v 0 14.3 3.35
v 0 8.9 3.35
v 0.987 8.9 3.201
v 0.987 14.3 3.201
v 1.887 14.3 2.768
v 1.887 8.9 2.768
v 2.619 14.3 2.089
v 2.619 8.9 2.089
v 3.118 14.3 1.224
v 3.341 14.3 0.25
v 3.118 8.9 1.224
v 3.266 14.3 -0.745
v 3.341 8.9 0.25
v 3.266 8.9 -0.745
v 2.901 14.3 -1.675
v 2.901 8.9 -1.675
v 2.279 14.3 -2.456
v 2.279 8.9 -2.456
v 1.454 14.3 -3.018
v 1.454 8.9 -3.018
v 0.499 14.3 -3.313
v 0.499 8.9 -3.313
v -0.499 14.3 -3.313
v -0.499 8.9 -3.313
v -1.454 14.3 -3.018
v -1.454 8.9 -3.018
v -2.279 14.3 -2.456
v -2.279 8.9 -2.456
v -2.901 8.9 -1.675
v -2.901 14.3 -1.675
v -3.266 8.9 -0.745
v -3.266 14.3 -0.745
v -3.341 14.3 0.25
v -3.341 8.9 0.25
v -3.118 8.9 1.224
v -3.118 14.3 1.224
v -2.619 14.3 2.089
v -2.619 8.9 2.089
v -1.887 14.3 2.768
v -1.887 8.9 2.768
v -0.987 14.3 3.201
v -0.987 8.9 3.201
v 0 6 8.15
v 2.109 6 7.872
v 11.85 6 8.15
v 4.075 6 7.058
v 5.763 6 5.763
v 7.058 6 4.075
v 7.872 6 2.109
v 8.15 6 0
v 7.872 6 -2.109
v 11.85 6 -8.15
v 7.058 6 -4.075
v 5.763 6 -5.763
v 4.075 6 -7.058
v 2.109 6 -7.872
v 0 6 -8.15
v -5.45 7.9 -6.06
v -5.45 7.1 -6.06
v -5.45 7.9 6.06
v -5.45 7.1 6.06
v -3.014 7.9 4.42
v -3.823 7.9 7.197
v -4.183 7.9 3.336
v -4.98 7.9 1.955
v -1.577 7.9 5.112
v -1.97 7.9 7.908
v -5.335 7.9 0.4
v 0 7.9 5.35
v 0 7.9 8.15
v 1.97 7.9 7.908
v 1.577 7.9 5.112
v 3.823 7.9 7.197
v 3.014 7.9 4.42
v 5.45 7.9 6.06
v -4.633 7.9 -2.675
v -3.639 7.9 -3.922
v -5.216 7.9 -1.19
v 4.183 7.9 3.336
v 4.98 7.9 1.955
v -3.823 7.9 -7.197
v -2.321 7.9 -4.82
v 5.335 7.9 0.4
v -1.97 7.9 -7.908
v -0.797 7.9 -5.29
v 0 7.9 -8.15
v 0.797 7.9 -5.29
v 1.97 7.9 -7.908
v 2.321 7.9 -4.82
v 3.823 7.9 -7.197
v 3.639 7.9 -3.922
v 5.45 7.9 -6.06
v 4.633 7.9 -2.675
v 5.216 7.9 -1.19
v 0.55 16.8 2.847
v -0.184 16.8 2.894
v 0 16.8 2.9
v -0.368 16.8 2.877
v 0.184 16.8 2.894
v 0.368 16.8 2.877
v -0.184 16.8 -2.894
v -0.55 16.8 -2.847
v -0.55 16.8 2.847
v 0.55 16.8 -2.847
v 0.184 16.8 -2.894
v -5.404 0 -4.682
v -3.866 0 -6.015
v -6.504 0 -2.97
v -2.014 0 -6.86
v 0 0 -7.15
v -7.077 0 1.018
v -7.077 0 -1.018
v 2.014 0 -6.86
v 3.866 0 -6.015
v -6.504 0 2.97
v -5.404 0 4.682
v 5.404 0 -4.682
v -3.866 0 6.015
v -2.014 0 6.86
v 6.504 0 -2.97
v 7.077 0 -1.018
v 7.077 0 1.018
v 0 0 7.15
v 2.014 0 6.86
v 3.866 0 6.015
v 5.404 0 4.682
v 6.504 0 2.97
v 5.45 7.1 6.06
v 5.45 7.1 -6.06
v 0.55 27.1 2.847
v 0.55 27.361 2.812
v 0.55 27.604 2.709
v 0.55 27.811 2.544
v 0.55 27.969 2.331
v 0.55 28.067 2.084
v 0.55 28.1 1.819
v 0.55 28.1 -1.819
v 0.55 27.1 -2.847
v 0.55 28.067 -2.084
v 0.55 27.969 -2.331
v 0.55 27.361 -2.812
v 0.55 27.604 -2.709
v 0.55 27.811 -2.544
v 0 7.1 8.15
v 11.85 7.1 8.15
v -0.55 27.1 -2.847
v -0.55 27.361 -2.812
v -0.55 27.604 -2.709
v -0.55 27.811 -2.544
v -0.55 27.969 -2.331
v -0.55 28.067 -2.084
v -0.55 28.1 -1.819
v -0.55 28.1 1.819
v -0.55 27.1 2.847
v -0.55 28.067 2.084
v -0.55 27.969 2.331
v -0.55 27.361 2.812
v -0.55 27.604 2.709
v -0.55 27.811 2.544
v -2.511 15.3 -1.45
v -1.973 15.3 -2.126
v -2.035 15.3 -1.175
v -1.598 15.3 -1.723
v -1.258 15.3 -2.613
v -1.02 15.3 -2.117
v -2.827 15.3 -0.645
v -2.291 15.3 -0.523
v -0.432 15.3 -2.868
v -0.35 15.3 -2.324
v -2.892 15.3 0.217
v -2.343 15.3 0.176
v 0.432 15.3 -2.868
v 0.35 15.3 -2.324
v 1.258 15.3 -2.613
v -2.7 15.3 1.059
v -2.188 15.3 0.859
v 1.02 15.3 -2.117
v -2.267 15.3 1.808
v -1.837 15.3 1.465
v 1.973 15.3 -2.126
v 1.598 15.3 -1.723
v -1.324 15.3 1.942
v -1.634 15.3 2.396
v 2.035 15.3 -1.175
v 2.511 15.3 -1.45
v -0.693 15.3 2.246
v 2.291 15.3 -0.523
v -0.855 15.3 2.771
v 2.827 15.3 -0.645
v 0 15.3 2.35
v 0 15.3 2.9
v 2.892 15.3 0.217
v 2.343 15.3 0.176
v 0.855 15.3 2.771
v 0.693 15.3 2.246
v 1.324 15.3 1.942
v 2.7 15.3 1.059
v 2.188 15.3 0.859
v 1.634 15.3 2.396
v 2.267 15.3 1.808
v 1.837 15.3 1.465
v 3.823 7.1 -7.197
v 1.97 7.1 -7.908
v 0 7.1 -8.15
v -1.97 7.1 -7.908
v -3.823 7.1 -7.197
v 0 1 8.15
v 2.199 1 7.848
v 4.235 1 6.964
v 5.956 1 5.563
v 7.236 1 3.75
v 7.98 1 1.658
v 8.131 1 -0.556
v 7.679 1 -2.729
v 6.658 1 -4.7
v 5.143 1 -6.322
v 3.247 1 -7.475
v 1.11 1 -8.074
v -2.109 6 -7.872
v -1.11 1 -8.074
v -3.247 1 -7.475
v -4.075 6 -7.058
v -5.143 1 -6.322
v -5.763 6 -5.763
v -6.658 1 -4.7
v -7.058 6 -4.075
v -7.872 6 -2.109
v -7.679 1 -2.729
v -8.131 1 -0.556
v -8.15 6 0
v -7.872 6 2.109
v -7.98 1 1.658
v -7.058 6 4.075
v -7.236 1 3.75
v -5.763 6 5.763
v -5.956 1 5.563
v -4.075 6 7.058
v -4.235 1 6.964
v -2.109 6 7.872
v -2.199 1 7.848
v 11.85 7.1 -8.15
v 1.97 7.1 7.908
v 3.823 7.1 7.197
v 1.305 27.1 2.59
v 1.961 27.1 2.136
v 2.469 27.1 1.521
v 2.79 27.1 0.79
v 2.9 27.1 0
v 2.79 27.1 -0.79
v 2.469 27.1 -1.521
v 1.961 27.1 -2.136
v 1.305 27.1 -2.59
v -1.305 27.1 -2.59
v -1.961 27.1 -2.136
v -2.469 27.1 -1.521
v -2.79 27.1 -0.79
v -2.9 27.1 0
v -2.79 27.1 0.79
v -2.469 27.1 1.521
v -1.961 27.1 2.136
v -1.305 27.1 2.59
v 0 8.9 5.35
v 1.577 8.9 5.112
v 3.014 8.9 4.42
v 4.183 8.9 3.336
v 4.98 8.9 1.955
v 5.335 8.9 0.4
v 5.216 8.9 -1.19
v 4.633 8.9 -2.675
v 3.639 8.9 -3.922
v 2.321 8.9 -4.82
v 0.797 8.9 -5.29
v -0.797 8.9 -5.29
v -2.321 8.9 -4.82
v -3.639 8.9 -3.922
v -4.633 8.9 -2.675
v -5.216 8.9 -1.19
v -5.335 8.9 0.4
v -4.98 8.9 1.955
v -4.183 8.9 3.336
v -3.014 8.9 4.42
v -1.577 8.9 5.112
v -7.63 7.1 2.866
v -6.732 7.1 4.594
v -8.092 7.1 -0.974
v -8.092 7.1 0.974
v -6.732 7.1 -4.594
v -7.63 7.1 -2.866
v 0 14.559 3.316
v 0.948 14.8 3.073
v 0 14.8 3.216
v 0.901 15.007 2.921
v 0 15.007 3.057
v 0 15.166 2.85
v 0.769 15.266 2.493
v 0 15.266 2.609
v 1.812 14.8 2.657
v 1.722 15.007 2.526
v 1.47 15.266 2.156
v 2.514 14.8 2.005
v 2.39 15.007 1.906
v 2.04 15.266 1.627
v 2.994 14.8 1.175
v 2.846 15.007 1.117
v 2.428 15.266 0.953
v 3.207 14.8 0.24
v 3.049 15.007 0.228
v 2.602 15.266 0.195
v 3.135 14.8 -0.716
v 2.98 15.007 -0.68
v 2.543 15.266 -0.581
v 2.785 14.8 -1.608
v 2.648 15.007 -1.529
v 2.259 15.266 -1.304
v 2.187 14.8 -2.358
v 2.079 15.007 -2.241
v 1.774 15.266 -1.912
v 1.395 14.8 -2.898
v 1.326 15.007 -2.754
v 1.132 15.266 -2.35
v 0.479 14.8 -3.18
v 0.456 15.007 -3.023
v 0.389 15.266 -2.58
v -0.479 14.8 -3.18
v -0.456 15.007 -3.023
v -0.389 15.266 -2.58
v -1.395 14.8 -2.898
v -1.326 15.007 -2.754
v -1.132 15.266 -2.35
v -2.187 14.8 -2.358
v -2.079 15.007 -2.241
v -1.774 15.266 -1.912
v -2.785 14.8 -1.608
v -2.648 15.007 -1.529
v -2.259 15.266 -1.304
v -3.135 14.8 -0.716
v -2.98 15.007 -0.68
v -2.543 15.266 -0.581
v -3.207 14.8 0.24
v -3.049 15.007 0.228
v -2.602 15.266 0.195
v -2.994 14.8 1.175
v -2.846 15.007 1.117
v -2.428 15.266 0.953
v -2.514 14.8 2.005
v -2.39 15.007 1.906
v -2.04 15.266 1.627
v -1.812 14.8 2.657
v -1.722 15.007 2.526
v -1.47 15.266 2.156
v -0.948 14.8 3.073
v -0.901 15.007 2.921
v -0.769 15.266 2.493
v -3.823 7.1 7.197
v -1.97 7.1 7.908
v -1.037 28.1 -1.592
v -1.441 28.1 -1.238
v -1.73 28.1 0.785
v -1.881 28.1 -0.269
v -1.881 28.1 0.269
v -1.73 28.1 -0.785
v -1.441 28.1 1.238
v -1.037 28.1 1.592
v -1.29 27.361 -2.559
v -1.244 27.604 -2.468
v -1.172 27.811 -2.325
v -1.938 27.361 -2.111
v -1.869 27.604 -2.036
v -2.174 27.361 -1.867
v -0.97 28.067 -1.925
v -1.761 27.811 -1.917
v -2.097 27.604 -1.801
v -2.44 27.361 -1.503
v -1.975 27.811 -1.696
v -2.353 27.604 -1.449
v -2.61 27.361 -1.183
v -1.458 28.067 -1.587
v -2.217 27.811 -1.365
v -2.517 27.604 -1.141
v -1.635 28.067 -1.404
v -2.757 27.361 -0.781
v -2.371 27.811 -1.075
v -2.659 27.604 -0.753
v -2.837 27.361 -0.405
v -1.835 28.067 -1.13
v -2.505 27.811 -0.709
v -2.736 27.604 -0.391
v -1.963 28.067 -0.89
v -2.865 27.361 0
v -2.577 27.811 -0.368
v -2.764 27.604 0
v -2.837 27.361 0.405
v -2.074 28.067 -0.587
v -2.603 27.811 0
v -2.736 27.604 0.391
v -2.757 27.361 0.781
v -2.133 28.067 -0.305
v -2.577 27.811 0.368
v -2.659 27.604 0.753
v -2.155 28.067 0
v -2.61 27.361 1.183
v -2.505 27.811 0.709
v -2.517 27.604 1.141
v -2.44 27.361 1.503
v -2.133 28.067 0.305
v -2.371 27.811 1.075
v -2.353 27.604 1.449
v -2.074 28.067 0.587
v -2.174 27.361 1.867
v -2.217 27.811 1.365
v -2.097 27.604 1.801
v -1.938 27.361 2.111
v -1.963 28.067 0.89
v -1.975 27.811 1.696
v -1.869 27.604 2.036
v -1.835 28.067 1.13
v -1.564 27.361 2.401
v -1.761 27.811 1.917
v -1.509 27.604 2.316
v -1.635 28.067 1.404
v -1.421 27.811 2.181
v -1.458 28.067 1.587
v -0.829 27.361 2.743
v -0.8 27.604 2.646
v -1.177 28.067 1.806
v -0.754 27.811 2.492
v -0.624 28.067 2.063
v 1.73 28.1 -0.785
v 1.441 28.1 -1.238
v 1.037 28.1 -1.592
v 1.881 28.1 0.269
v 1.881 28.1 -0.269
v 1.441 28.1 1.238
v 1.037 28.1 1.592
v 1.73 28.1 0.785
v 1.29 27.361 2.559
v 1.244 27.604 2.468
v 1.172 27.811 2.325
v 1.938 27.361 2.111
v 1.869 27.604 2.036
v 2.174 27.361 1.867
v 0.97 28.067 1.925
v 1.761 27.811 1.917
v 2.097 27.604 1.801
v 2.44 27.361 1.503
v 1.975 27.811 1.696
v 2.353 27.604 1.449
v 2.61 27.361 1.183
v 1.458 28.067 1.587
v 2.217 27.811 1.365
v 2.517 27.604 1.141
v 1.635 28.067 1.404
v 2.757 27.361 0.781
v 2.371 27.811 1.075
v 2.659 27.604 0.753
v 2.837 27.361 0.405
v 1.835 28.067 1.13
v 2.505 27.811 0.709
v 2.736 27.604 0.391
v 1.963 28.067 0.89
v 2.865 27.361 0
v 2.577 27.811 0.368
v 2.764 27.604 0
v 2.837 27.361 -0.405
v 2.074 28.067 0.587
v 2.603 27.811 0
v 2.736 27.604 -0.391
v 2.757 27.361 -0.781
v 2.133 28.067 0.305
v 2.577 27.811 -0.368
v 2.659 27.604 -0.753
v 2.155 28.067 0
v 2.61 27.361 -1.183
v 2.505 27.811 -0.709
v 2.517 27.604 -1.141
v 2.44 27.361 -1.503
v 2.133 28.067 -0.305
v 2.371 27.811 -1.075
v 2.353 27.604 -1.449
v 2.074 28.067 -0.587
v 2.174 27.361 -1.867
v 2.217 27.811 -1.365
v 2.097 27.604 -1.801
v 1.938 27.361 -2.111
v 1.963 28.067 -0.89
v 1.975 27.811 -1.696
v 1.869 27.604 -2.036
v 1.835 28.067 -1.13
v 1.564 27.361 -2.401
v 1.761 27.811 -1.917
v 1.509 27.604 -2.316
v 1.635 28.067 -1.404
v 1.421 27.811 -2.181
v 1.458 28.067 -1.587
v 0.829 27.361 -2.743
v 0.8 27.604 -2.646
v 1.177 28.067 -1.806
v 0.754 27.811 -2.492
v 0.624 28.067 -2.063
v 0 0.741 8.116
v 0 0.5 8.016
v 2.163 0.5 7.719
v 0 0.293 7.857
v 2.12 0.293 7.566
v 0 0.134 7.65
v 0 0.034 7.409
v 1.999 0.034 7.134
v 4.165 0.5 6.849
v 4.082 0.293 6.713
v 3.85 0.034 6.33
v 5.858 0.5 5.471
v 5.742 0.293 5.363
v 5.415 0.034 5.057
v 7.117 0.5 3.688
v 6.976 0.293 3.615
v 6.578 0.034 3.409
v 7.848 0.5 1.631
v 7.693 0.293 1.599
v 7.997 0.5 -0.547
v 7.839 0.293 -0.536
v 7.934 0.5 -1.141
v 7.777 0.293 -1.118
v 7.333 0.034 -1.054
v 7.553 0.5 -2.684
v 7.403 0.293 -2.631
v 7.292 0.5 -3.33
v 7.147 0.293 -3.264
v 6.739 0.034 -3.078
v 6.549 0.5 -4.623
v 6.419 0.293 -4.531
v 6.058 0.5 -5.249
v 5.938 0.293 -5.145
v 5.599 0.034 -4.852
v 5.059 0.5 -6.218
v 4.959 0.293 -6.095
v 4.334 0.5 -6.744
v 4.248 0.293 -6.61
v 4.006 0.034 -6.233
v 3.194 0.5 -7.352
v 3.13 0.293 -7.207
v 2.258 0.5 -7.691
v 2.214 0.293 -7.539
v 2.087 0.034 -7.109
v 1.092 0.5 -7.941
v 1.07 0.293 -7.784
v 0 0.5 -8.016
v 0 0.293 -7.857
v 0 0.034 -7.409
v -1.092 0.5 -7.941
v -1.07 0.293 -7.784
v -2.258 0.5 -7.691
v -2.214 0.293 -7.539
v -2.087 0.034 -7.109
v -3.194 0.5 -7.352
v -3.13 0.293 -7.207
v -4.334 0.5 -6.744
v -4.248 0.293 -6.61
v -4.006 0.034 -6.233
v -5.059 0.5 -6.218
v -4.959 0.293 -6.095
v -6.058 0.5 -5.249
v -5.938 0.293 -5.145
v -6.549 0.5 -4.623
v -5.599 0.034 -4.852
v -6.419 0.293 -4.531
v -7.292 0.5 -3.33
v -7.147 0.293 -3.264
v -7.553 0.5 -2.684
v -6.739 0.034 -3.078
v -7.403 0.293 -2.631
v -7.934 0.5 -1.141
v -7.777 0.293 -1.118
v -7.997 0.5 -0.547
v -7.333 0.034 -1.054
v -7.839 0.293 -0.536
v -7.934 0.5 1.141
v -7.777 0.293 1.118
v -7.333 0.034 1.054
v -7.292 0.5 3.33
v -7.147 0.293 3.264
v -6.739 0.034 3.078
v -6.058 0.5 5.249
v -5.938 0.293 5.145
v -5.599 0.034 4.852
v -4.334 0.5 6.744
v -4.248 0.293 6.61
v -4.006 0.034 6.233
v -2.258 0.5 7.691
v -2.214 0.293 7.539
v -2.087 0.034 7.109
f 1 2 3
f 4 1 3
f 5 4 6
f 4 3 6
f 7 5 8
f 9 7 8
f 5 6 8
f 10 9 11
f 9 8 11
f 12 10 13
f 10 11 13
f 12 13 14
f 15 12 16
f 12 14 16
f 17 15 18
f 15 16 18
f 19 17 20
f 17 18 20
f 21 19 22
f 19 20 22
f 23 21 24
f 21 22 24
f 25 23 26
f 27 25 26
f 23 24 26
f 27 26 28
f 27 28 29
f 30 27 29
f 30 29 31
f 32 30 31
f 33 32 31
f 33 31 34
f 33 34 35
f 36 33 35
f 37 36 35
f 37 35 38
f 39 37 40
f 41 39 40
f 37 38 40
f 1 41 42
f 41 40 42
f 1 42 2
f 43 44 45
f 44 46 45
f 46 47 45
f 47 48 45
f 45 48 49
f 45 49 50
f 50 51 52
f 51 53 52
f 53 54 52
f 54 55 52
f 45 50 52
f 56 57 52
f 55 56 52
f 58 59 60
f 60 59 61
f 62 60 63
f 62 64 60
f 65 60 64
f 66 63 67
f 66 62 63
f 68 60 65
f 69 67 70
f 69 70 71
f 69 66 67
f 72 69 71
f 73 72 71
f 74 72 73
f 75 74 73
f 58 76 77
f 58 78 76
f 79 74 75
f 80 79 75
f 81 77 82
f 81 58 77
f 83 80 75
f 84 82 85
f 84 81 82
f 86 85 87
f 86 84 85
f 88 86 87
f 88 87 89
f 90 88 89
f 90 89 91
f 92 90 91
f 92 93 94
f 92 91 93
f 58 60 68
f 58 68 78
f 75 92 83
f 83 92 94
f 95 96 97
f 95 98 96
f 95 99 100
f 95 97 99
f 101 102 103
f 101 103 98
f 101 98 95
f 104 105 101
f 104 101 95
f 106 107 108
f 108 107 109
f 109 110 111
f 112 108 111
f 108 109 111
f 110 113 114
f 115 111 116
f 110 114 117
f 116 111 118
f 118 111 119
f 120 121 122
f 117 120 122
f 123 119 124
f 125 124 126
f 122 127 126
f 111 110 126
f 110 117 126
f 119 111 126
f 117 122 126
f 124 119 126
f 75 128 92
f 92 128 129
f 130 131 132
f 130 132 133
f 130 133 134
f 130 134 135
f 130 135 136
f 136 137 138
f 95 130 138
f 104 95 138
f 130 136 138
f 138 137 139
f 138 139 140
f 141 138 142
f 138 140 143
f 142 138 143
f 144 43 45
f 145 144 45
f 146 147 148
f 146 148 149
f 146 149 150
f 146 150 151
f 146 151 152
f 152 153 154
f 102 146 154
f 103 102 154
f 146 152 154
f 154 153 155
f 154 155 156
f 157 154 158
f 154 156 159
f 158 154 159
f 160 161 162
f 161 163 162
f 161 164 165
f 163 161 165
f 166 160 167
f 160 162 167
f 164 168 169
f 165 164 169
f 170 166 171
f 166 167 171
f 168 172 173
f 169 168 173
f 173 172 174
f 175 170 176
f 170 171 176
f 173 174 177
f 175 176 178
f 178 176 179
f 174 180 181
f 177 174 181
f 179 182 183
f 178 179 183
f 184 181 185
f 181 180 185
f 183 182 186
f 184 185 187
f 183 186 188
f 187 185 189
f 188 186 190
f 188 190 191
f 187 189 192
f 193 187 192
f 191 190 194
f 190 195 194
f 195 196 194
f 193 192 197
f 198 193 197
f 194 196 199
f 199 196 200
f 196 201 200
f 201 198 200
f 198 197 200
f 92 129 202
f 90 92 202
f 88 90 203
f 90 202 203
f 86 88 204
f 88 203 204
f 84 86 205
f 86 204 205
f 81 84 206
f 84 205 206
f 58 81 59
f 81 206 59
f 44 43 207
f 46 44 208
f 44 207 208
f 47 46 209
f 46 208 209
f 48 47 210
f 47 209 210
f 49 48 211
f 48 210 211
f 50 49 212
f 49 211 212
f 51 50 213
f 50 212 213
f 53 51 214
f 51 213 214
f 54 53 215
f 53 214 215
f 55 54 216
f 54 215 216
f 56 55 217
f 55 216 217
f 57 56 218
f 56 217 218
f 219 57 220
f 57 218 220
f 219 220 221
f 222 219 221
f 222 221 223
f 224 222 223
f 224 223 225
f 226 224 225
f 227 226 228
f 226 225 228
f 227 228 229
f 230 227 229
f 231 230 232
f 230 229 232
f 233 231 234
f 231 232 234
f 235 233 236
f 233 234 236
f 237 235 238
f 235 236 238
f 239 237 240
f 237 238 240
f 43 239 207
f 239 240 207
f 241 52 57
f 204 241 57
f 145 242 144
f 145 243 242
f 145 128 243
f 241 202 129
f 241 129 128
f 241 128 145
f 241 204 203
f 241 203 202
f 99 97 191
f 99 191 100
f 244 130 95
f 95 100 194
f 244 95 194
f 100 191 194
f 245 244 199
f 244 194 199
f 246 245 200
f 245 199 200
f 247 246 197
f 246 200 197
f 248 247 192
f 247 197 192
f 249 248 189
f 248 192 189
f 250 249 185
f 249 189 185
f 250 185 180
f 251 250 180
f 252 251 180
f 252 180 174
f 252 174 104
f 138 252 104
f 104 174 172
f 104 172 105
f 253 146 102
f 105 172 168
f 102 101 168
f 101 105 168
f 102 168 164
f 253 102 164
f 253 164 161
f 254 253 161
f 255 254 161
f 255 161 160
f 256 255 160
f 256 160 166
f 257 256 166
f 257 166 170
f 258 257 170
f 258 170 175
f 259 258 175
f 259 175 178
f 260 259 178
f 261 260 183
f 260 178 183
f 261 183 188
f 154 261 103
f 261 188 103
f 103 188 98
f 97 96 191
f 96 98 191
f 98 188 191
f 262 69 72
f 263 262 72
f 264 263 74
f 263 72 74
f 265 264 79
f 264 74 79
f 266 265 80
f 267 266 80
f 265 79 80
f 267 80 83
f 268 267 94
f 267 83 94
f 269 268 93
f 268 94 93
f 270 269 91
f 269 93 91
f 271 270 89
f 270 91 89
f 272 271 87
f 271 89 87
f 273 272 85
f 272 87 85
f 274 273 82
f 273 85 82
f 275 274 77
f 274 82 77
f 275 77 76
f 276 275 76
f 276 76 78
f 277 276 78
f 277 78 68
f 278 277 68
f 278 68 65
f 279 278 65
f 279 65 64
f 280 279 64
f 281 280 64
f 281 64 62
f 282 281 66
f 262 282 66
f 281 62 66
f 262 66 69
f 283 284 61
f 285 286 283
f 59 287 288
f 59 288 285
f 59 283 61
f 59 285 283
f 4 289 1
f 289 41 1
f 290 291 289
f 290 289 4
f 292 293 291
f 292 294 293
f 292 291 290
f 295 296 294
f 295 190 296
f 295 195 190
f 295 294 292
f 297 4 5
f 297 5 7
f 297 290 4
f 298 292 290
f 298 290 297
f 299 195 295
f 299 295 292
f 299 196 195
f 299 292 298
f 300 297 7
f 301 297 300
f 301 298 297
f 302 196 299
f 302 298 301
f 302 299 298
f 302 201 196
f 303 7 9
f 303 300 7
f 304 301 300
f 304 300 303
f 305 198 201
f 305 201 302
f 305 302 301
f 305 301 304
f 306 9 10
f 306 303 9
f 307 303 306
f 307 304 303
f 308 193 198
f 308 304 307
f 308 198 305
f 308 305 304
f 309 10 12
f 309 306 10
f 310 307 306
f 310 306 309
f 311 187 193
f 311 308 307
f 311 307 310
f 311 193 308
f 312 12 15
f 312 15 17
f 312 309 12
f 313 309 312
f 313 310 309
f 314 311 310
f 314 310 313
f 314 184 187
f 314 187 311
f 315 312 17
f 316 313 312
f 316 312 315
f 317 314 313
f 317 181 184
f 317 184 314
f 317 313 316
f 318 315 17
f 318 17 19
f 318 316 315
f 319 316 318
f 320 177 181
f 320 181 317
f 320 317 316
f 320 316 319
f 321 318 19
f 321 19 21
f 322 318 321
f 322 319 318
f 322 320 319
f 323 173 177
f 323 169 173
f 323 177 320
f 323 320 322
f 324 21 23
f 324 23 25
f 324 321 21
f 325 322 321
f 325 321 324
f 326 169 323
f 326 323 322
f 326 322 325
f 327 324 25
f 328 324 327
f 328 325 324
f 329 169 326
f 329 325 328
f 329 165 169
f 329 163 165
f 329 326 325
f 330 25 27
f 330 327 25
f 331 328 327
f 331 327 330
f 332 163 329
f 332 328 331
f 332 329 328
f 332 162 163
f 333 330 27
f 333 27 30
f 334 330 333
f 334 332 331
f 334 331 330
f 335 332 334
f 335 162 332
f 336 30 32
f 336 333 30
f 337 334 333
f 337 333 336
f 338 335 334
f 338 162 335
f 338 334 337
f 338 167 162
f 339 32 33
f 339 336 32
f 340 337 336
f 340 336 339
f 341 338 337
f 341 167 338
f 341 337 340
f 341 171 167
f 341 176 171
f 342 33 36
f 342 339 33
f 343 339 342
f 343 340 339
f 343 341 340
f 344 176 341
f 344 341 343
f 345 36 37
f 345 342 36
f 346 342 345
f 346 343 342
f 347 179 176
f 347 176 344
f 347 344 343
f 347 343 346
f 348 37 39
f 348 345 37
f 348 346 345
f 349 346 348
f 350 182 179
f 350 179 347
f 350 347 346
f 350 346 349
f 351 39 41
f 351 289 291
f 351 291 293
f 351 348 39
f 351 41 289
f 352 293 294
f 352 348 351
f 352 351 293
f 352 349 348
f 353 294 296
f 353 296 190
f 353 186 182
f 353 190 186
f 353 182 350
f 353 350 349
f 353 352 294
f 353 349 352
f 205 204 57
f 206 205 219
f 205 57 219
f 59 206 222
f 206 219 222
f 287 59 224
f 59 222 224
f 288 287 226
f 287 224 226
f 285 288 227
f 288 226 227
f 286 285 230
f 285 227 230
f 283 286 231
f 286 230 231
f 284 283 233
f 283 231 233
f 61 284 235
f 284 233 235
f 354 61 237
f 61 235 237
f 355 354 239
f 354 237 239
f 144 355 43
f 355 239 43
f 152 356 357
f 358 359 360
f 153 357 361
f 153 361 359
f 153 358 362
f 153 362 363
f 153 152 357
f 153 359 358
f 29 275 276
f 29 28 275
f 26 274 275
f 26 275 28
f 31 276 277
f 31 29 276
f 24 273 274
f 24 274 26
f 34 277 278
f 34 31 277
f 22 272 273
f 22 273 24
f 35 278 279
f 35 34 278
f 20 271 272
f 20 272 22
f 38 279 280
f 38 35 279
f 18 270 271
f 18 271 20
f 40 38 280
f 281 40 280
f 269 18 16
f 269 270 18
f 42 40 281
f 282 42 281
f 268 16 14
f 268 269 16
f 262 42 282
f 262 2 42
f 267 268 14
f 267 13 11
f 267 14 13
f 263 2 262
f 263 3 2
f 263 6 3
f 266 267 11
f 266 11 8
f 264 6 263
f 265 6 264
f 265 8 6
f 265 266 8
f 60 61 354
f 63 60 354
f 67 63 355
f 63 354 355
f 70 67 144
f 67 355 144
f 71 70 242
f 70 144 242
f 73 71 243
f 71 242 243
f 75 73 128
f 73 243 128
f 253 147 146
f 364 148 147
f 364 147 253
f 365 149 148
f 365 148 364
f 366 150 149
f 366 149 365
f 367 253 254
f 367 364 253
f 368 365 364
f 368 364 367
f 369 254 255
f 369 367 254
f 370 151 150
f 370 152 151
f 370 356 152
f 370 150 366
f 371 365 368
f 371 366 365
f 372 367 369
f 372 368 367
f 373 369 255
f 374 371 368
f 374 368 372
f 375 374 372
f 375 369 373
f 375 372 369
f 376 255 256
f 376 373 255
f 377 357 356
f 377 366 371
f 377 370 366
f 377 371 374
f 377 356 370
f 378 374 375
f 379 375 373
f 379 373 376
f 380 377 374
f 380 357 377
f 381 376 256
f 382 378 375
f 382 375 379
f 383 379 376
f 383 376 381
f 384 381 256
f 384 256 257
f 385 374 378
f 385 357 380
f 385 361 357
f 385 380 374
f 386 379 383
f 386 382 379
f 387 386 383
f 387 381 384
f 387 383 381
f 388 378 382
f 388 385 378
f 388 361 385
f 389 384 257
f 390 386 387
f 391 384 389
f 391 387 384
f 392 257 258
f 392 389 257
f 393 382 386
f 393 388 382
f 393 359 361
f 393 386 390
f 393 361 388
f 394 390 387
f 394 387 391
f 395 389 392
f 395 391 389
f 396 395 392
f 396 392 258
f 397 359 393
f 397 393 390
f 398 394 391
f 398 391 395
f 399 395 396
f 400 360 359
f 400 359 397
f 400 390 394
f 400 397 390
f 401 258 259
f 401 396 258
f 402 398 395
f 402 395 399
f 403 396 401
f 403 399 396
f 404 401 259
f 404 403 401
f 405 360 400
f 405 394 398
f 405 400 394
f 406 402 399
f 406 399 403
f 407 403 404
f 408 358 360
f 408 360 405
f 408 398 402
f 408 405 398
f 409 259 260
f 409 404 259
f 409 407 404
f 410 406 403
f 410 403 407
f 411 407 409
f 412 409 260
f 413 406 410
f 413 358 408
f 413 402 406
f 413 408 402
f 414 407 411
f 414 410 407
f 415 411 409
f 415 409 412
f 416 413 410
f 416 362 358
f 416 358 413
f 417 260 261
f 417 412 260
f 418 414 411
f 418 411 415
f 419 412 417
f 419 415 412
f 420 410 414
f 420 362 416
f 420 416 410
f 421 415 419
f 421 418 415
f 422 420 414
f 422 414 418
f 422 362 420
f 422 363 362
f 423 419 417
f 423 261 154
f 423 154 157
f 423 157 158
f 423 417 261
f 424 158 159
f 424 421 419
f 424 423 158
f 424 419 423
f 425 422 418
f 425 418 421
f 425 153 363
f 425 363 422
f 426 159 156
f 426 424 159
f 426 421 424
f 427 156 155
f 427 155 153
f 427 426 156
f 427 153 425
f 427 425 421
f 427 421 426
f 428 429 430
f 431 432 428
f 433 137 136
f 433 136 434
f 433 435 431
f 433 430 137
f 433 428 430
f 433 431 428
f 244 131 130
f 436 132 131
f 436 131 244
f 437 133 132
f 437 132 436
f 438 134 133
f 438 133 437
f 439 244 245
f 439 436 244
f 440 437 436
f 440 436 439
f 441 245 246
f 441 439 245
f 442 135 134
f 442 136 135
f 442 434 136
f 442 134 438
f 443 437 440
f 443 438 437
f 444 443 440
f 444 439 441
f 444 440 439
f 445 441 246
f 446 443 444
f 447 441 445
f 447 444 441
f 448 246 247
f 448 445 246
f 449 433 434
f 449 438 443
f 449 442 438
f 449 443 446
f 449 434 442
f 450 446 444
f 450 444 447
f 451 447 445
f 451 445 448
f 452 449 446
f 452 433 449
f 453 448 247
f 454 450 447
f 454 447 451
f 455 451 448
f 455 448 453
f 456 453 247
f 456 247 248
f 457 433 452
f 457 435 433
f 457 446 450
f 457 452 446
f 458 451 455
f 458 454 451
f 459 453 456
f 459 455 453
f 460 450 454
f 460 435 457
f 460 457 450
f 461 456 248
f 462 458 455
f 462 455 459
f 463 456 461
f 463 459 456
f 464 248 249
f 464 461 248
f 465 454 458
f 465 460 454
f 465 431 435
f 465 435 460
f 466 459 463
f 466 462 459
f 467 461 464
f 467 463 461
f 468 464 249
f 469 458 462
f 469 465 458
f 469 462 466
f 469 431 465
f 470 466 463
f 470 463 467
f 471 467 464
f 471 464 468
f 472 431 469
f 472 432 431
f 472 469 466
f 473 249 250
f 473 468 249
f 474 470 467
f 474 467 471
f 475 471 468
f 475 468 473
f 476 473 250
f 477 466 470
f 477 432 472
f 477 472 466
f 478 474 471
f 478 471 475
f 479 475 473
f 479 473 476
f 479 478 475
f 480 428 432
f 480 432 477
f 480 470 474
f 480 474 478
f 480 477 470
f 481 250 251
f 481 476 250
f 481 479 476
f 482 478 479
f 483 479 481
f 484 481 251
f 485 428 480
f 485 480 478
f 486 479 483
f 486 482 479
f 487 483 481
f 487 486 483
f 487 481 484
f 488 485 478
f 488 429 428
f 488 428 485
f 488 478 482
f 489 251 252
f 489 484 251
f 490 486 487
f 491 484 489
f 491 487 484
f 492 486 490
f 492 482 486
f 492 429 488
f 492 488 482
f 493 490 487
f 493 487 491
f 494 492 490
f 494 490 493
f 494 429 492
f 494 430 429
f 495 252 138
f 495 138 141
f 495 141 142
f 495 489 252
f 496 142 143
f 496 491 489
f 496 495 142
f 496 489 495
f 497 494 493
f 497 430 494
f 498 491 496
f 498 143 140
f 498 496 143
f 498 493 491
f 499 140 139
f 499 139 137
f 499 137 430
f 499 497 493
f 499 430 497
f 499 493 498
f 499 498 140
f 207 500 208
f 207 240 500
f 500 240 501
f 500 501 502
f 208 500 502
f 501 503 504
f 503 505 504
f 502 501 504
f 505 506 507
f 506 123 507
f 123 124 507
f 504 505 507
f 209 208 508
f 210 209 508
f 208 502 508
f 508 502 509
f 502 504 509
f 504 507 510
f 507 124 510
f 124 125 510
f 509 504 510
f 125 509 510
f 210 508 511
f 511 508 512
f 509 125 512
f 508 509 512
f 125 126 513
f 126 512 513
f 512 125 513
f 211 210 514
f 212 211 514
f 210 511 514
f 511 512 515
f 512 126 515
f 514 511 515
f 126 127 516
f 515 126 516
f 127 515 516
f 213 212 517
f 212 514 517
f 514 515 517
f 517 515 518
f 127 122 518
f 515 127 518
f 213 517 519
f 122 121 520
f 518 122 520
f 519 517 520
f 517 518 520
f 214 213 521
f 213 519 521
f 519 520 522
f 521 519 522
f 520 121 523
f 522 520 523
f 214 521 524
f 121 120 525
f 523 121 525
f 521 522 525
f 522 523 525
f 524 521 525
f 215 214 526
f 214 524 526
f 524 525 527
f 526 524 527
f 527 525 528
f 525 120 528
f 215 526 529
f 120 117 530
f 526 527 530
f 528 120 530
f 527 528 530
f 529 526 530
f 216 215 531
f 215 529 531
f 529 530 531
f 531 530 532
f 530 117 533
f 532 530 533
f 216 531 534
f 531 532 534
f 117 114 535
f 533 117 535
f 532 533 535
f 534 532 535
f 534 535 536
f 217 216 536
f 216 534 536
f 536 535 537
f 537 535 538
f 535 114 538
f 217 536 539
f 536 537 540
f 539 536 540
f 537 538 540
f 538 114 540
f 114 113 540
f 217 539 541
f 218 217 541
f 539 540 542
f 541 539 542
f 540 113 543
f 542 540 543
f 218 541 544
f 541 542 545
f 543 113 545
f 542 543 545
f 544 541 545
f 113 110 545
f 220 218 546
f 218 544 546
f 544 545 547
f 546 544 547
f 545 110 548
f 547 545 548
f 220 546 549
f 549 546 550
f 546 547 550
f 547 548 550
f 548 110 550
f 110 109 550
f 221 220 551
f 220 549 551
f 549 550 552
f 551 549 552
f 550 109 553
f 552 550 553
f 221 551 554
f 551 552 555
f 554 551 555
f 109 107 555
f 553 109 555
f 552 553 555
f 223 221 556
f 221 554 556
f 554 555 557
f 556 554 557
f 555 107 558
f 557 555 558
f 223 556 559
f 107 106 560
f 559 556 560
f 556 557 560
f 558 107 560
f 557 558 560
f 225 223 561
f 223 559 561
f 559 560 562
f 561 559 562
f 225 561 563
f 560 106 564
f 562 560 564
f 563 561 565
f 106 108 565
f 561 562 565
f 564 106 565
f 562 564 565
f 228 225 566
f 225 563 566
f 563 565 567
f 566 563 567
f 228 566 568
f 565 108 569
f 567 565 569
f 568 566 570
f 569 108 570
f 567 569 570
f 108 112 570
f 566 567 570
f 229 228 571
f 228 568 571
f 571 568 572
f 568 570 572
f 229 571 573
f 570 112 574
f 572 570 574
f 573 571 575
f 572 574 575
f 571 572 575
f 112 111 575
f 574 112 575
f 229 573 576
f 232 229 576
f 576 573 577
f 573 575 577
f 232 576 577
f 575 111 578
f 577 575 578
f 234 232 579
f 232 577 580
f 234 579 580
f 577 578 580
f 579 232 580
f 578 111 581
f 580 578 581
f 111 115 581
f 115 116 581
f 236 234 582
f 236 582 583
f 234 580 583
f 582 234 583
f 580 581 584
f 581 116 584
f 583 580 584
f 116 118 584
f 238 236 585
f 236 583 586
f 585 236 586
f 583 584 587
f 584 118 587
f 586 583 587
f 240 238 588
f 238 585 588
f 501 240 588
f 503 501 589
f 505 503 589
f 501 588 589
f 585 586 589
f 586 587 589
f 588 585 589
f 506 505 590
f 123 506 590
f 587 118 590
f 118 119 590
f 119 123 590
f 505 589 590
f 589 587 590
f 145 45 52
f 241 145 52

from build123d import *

# Parameters (mm, degrees)
SKETCH1_R           = 8.149999999999999
BOSS_EXTRUDE1_DEPTH = 6
BOSS_EXTRUDE2_DEPTH = 1.1
BOSS_EXTRUDE3_DEPTH = 0.8
SKETCH4_R           = 5.35
BOSS_EXTRUDE4_DEPTH = 1
SKETCH5_R           = 3.35
BOSS_EXTRUDE5_DEPTH = 6.4
FILLET1_R           = 1
SKETCH6_R           = 2.9
BOSS_EXTRUDE6_DEPTH = 12.8
CUT_EXTRUDE1_DEPTH  = 11.3
FILLET2_R           = 1


with BuildPart() as part:
    # Sketch1 → Boss-Extrude1 (new body)
    with BuildSketch(Plane(origin=(0, 0, 0), x_dir=(1, 0, 0), z_dir=(0, 1, 0))):
        with Locations(Location((0, 0, 0), (0, 0, 270))):
            Circle(SKETCH1_R)
    extrude(amount=BOSS_EXTRUDE1_DEPTH)

    # Sketch2 → Boss-Extrude2 (add)
    with BuildSketch(Plane(origin=(0, 6, 0), x_dir=(1, 0, 0), z_dir=(0, 1, 0))):
        with BuildLine():
            Line((0, -8.15), (11.85, -8.15))
            Line((11.85, -8.15), (11.849999999999996, 8.150000000000004))
            Line((11.849999999999996, 8.150000000000004), (0, 8.15))
            ThreePointArc((0, 8.15), (-8.15, 1e-15), (0, -8.15))
        make_face()
    extrude(amount=BOSS_EXTRUDE2_DEPTH)

    # Sketch3 → Boss-Extrude3 (add)
    with BuildSketch(Plane(origin=(0, 7.1000000000000005, 0), x_dir=(1, 0, 0), z_dir=(0, 1, 0))):
        with BuildLine():
            Line((-5.45, 6.059702963017249), (-5.45, -6.059702963017249))
            ThreePointArc((-5.45, -6.059702963017249), (-1.31e-15, -8.150000000000002), (5.45, -6.059702963017249))
            Line((5.45, -6.059702963017249), (5.45, 6.059702963017249))
            ThreePointArc((5.45, 6.059702963017249), (5e-16, 8.150000000000002), (-5.45, 6.059702963017249))
        make_face()
    extrude(amount=BOSS_EXTRUDE3_DEPTH)

    # Sketch4 → Boss-Extrude4 (add)
    with BuildSketch(Plane(origin=(0, 7.9, 0), x_dir=(1, 0, 0), z_dir=(0, 1, 0))):
        with Locations(Location((0, 0, 0), (0, 0, 270))):
            Circle(SKETCH4_R)
    extrude(amount=BOSS_EXTRUDE4_DEPTH)

    # Sketch5 → Boss-Extrude5 (add)
    with BuildSketch(Plane(origin=(0, 8.900000000000002, 0), x_dir=(1, 0, 0), z_dir=(0, 1, 0))):
        with Locations(Location((0, 0, 0), (0, 0, 270))):
            Circle(SKETCH5_R)
    extrude(amount=BOSS_EXTRUDE5_DEPTH)

    # Fillet1
    fillet1_edges = [part.edges().sort_by_distance(p)[0] for p in [
        (2.5e-15, 0, -8.149999999999999),
        (1.03e-15, 15.300000000000002, -3.35),
    ]]
    fillet(fillet1_edges, radius=FILLET1_R)

    # Sketch6 → Boss-Extrude6 (add)
    with BuildSketch(Plane(origin=(0, 15.3, 0), x_dir=(1, 0, 0), z_dir=(0, 1, 0))):
        with Locations(Location((0, 0, 0), (0, 0, 270))):
            Circle(SKETCH6_R)
    extrude(amount=BOSS_EXTRUDE6_DEPTH)

    # Sketch7 → Cut-Extrude1 (cut)
    with BuildSketch(Plane(origin=(0, 28.1, 0), x_dir=(1, 0, 0), z_dir=(0, 1, 0))):
        Polygon((0.5499999999999995, 5.000000000000001), (-0.5500000000000006, 5.000000000000001), (-0.5499999999999994, -4.999999999999999), (0.5500000000000007, -4.999999999999999), align=None)
    extrude(amount=-CUT_EXTRUDE1_DEPTH, mode=Mode.SUBTRACT)

    # Fillet2
    fillet2_edges = [part.edges().sort_by_distance(p)[0] for p in [
        (2.9, 28.1, 7.347e-14),
        (-2.9, 28.1, 7.105e-14),
    ]]
    fillet(fillet2_edges, radius=FILLET2_R)


solid = part.part
